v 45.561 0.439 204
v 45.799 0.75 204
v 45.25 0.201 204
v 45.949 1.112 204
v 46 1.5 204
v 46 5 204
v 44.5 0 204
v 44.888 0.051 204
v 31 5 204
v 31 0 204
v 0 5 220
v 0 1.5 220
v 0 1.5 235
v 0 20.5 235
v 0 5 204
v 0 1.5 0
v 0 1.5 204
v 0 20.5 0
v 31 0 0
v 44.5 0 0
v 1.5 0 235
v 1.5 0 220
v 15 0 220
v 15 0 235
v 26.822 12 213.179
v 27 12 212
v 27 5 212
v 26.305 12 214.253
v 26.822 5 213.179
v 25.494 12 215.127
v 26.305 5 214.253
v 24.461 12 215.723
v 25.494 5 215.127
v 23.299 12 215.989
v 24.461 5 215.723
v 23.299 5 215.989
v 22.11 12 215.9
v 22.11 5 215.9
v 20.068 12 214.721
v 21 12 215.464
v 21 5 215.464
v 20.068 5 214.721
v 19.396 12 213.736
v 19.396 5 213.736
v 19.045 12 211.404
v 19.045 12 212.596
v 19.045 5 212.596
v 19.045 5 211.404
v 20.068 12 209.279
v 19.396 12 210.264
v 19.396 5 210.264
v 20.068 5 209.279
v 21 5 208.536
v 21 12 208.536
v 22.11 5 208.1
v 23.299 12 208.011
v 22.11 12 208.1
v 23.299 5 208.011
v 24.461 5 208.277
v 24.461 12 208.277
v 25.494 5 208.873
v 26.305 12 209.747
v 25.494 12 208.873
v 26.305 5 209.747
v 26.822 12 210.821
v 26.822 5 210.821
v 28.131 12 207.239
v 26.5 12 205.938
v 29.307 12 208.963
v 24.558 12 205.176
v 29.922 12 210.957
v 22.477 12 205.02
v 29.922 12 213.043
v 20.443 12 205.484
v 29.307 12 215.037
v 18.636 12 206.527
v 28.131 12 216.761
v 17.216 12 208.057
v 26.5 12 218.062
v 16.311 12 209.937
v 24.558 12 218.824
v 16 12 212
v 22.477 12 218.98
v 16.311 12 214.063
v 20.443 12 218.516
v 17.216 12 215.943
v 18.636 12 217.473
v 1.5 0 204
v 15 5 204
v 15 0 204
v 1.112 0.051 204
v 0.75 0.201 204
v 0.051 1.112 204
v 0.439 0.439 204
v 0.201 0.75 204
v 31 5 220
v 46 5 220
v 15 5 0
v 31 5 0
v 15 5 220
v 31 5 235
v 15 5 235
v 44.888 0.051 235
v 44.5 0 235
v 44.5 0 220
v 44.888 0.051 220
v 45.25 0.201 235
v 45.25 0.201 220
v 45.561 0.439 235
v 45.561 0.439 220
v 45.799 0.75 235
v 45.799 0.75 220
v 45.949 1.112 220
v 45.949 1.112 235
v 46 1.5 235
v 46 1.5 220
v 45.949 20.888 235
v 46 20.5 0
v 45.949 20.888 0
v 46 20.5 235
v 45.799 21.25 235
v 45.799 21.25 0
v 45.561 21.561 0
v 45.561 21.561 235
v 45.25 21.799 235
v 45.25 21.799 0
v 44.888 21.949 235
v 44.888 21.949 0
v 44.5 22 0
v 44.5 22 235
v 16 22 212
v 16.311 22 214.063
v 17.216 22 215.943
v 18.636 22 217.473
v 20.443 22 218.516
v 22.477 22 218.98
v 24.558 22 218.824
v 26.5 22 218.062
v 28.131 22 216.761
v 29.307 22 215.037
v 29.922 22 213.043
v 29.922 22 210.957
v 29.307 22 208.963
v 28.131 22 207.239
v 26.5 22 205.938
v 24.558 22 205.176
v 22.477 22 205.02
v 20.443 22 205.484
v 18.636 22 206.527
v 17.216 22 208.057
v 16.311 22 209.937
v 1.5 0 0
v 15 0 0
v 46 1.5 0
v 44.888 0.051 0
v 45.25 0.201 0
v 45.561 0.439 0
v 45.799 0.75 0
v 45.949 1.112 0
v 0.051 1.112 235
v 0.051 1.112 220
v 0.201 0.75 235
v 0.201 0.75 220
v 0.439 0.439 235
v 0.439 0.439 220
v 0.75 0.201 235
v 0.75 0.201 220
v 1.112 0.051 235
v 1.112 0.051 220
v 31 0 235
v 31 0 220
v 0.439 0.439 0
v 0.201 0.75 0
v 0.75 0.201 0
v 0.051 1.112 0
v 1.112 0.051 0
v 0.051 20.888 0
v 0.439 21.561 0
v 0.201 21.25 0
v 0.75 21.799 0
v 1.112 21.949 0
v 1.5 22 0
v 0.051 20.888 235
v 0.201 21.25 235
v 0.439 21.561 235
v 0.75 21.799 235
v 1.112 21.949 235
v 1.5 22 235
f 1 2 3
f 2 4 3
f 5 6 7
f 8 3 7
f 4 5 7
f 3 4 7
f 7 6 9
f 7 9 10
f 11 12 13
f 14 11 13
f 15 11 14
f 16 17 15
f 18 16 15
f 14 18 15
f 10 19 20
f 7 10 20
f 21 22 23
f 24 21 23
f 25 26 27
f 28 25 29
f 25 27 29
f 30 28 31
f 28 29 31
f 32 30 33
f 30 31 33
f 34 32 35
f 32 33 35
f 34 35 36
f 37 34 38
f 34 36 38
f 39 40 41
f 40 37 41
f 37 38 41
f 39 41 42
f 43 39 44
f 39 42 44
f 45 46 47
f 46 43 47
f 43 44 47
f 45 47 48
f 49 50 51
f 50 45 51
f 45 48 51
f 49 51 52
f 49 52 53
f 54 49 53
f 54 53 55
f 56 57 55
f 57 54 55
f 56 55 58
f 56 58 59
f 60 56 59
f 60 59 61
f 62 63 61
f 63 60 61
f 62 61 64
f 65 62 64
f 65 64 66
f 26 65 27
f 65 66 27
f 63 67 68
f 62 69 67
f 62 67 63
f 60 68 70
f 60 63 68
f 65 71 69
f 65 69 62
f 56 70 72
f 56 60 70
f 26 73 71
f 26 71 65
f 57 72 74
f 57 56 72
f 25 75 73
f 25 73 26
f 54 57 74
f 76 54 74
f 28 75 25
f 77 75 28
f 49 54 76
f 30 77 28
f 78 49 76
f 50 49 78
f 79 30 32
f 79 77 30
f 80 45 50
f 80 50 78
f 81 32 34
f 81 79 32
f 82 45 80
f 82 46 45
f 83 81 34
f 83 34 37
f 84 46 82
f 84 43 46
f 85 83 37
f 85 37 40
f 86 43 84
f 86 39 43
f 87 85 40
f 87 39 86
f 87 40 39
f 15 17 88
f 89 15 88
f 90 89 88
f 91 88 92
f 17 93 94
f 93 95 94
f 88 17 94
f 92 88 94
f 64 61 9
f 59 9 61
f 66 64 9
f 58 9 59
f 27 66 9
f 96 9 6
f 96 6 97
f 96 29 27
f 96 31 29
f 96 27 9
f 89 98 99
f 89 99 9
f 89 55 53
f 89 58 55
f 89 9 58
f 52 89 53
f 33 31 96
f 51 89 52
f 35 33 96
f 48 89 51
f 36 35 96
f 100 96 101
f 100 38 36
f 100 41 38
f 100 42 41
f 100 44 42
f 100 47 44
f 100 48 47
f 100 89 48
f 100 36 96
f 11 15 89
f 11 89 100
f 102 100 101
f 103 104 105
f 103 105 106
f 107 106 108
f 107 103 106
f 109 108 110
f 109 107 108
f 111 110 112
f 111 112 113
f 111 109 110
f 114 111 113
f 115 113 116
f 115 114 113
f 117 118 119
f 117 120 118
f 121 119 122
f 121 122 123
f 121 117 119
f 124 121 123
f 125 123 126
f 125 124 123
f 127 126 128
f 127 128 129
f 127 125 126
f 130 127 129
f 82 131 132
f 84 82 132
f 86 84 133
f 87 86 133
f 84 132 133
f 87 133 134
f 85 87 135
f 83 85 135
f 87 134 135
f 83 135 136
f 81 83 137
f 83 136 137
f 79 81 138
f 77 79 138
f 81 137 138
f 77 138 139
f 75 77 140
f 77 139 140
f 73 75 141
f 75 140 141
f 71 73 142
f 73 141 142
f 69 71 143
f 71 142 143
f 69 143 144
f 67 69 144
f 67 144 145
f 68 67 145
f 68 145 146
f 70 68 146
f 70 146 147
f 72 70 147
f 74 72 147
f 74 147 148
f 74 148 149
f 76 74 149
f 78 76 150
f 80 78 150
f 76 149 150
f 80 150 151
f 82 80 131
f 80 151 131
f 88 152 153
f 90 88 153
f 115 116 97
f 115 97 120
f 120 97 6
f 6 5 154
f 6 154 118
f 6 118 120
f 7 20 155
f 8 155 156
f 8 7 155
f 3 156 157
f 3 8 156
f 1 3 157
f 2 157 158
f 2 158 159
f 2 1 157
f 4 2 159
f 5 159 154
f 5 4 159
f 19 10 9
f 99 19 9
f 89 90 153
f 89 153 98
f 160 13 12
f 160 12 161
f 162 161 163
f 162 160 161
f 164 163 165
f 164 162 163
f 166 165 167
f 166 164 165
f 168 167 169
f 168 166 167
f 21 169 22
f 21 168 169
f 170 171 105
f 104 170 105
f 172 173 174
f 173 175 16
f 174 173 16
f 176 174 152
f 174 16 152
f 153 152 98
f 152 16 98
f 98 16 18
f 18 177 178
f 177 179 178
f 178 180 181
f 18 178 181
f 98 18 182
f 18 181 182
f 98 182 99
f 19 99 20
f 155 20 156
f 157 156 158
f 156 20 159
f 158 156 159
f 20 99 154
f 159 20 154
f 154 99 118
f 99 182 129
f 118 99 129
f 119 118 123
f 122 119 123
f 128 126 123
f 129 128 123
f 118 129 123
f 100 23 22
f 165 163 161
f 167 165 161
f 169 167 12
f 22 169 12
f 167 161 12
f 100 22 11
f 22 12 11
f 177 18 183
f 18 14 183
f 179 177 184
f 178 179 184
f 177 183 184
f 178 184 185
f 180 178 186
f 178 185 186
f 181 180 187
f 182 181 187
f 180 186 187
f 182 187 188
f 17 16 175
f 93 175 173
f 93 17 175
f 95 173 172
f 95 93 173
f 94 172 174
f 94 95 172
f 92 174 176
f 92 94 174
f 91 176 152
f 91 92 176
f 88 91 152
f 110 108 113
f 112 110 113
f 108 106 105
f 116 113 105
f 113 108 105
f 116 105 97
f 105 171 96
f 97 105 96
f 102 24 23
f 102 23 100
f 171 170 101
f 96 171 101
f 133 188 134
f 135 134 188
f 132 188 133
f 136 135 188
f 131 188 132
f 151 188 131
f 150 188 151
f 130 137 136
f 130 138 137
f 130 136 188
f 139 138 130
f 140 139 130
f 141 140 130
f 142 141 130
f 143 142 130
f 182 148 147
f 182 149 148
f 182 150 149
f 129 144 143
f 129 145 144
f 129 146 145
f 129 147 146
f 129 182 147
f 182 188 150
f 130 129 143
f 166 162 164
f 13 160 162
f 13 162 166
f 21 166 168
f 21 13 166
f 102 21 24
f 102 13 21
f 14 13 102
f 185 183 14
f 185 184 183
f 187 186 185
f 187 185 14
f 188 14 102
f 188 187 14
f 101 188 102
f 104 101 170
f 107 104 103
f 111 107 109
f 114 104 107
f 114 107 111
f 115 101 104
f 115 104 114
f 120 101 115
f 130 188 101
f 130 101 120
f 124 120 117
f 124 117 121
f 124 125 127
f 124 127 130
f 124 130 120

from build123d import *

# Parameters (mm, degrees)
F0_W      = 46
F0_H      = 22
F1_DEPTH  = 235
F2_R      = 1.5
F3_W      = 3.5
F3_H      = 16
F3_W_2    = 1.5
F4_DEPTH  = 46.001
F5_W      = 16
F5_H      = 5
F6_DEPTH  = 235.001
F7_R      = 4
F8_DEPTH  = 17.001
F9_R      = 7
F9_R_2    = 4
F10_DEPTH = 10


with BuildPart() as f1:
    # F0 (on Top) → F1 (new body)
    with BuildSketch(Plane.XY):
        with Locations((23, 11)):
            Rectangle(F0_W, F0_H)
    extrude(amount=F1_DEPTH)

    # F2
    f2_edges = [f1.edges().sort_by_distance(p)[0] for p in [
        (46, 0, 117.5),
        (46, 22, 117.5),
        (0, 0, 117.5),
        (0, 22, 117.5),
    ]]
    fillet(f2_edges, radius=F2_R)

    # F3 (on face) → F4 (cut, through all)
    with BuildSketch(Plane(origin=(0, 0, 0), x_dir=(0, -1, 0), z_dir=(-1, 0, 0))):
        with Locations((-3.25, 212)):
            Rectangle(F3_W, F3_H)
        with Locations((-0.75, 212)):
            Rectangle(F3_W_2, F3_H)
    extrude(amount=-F4_DEPTH, mode=Mode.SUBTRACT)

    # F5 (on face) → F6 (cut, through all)
    with BuildSketch(Plane.XY.offset(235)):
        with Locations((23, 2.5)):
            Rectangle(F5_W, F5_H)
    extrude(amount=-F6_DEPTH, mode=Mode.SUBTRACT)

    # F7 (on face) → F8 (cut, through all)
    with BuildSketch(Plane.XZ.offset(-5)):
        with Locations((23, 212)):
            Circle(F7_R)
    extrude(amount=-F8_DEPTH, mode=Mode.SUBTRACT)

    # F9 (on face) → F10 (cut)
    with BuildSketch(Plane(origin=(0, 22, 0), x_dir=(-1, 0, 0), z_dir=(0, 1, 0))):
        with Locations((-23, 212)):
            Circle(F9_R)
        with Locations((-23, 212)):
            Circle(F9_R_2, mode=Mode.SUBTRACT)
    extrude(amount=-F10_DEPTH, mode=Mode.SUBTRACT)


solid = f1.part
